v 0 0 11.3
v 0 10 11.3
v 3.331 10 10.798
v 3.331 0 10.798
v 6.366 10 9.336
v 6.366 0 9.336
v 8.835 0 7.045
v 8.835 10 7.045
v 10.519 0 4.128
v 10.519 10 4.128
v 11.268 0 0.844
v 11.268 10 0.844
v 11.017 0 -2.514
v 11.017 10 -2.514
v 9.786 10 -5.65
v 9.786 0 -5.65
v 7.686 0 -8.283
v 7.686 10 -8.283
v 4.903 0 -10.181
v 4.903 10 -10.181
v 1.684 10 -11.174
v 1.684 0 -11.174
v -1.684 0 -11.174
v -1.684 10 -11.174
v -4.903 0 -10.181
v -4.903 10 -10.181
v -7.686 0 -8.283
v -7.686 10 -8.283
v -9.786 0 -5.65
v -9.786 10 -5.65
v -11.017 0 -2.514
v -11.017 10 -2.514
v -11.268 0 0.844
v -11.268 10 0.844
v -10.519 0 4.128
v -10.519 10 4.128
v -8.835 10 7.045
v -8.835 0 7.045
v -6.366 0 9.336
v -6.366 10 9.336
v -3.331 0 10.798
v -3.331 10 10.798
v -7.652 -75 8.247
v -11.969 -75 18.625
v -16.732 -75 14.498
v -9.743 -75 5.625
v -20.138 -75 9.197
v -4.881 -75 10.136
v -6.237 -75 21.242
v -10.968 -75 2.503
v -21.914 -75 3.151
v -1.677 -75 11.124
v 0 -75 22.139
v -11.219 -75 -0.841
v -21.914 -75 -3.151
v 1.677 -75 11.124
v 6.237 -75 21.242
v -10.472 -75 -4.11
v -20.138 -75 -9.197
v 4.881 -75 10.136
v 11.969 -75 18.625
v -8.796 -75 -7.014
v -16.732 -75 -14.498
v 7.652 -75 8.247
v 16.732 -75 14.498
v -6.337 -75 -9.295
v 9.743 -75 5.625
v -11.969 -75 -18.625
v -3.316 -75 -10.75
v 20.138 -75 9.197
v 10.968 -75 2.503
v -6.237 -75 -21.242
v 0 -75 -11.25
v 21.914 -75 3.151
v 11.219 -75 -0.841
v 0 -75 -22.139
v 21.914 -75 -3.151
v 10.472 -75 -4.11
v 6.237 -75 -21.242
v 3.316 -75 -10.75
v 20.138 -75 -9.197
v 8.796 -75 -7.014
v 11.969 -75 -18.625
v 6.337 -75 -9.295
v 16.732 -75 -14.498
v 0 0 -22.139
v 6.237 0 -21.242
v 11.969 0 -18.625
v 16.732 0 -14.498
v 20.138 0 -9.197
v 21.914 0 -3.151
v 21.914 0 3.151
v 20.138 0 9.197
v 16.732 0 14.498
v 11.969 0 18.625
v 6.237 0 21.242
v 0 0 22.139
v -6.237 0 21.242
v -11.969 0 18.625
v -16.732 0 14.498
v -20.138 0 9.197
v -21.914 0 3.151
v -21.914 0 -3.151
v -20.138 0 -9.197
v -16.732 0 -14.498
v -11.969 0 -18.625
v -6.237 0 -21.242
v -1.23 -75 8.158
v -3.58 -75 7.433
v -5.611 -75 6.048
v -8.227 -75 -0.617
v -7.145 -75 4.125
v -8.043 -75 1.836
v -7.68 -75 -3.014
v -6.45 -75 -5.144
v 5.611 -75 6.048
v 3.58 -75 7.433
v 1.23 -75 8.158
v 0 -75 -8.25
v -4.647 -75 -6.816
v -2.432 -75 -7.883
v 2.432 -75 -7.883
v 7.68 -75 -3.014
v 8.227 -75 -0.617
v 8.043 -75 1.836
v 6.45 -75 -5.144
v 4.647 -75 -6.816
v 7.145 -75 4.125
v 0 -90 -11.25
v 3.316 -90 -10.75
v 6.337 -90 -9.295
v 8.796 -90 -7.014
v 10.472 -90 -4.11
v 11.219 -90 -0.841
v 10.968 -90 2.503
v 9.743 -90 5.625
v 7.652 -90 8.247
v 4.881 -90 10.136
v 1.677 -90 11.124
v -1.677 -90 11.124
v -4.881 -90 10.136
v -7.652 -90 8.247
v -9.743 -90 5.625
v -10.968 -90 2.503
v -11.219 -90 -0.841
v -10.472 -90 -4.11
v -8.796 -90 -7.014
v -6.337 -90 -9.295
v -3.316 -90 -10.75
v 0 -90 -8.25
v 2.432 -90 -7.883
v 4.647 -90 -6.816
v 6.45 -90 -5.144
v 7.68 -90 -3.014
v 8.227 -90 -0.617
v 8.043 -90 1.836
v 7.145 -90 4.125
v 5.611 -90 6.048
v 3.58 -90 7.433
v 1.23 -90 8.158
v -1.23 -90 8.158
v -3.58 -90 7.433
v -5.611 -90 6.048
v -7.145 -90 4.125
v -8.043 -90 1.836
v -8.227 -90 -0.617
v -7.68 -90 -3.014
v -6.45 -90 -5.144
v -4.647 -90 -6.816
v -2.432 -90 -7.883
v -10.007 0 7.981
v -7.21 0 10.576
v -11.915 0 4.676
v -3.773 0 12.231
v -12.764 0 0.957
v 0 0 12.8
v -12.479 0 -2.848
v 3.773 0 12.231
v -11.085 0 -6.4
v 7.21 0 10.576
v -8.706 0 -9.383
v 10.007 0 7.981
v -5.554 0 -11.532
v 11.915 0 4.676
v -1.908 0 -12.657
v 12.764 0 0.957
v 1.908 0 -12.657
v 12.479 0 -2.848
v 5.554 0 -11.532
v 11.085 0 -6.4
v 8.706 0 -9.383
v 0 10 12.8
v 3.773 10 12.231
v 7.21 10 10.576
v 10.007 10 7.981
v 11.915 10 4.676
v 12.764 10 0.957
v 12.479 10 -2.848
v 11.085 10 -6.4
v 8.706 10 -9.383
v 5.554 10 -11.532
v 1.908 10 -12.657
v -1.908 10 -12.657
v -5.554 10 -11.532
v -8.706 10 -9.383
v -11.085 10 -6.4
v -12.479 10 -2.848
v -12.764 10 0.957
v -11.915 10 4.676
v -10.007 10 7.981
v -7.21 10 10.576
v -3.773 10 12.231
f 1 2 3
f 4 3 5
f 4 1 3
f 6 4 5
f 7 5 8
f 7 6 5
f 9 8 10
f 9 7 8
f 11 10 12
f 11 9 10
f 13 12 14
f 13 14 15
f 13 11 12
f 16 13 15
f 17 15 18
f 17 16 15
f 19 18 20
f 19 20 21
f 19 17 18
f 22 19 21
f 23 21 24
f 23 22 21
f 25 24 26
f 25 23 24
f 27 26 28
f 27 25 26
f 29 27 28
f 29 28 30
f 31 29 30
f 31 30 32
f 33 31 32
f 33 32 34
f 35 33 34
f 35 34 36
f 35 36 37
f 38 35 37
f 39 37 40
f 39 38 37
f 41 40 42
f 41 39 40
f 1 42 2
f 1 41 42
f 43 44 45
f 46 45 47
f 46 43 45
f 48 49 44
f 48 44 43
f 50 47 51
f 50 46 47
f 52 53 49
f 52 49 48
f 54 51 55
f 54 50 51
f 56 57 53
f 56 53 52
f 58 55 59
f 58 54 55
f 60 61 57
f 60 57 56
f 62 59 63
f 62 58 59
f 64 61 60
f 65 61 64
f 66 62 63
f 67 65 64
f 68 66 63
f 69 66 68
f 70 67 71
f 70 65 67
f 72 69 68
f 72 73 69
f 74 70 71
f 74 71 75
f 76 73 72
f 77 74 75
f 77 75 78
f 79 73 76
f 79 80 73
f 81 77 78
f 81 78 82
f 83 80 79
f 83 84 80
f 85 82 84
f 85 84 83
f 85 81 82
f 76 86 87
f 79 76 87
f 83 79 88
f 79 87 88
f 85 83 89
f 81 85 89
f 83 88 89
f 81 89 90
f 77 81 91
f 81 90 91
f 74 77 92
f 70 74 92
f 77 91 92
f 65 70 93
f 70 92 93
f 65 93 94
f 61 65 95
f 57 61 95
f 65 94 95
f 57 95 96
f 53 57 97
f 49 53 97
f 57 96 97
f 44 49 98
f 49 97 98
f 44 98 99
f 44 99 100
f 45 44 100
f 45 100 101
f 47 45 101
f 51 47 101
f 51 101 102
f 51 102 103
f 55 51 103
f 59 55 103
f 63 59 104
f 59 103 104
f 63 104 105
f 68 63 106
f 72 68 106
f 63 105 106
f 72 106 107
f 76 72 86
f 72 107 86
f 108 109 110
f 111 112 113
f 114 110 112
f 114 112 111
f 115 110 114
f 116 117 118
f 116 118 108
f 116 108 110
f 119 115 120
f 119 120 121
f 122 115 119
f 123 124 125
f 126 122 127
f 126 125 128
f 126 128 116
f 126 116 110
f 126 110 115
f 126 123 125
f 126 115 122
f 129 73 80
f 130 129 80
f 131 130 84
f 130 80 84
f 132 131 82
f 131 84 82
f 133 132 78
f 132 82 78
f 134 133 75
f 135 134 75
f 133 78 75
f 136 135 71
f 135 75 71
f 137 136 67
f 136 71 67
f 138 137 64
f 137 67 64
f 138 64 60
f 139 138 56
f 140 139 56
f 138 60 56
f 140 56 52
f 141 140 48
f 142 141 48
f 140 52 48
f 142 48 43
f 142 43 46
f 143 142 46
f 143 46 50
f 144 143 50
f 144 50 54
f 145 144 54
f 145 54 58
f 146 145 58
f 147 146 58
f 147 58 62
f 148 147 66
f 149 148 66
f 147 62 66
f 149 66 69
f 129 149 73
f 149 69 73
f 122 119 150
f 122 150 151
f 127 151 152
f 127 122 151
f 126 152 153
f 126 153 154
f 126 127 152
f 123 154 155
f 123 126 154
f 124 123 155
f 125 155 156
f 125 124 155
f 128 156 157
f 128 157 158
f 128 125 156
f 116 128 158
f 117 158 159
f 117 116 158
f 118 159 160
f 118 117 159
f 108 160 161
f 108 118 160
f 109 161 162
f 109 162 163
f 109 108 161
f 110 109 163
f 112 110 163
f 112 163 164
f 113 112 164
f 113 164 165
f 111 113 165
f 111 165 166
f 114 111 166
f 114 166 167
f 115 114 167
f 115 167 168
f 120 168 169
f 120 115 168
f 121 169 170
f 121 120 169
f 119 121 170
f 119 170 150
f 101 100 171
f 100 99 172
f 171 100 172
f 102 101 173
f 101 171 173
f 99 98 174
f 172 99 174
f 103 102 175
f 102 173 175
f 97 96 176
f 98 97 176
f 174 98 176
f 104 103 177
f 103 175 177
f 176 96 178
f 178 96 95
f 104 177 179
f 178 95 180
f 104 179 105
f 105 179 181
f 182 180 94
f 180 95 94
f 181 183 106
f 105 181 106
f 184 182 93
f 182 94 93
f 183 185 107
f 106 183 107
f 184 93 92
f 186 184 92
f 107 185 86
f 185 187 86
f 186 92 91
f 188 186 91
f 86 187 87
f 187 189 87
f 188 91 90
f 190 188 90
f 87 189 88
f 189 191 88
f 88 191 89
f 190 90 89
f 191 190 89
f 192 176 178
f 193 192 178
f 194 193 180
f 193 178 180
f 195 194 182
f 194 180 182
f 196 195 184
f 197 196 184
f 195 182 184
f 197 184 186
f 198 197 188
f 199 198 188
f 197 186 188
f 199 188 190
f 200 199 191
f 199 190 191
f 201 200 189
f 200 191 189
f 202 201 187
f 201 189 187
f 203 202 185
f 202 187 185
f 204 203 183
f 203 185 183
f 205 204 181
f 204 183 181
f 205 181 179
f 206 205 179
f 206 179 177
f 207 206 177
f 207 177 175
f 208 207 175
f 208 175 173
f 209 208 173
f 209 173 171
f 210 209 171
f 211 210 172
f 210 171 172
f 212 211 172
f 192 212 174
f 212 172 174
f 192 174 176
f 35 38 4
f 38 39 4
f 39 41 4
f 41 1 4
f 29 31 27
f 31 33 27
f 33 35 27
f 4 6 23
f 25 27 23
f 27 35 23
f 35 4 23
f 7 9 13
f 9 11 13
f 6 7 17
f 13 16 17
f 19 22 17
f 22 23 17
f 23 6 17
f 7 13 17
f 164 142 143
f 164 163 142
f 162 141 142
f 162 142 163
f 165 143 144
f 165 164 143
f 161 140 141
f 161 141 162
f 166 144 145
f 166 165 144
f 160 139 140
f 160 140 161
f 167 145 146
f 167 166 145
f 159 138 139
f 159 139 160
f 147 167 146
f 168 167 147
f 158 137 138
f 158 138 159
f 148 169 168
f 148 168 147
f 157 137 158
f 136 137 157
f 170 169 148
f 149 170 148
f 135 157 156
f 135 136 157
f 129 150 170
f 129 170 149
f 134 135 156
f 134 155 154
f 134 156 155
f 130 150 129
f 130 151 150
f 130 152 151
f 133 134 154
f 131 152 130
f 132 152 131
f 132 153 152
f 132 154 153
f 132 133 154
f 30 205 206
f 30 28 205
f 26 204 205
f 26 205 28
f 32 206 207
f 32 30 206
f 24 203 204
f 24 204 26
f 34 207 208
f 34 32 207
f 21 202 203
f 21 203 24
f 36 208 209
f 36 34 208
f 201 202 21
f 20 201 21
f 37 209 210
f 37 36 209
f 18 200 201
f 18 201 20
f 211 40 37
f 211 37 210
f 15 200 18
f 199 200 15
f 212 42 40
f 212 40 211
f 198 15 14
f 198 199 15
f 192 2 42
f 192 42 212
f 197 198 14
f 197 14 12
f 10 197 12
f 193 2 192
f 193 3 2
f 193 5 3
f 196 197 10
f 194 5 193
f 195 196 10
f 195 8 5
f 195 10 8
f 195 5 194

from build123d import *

# Parameters (mm, degrees)
SKETCH1_R           = 12.8
SKETCH1_R_2         = 11.3
BOSS_EXTRUDE1_DEPTH = 10
SKETCH2_R           = 22.139080492
BOSS_EXTRUDE2_DEPTH = 75
SKETCH3_R           = 11.25
SKETCH3_R_2         = 8.25
BOSS_EXTRUDE3_DEPTH = 15


with BuildPart() as part:
    # Sketch1 → Boss-Extrude1 (new body)
    with BuildSketch(Plane(origin=(0, 0, 0), x_dir=(1, 0, 0), z_dir=(0, 1, 0))):
        with Locations(Location((0, 0, 0), (0, 0, 270))):
            Circle(SKETCH1_R)
        with Locations(Location((0, 0, 0), (0, 0, 270))):
            Circle(SKETCH1_R_2, mode=Mode.SUBTRACT)
    extrude(amount=BOSS_EXTRUDE1_DEPTH)

    # Sketch2 → Boss-Extrude2 (add)
    with BuildSketch(Plane.XZ):
        with Locations(Location((0, 0, 0), (0, 0, 270))):
            Circle(SKETCH2_R)
    extrude(amount=BOSS_EXTRUDE2_DEPTH)

    # Sketch3 → Boss-Extrude3 (add)
    with BuildSketch(Plane.XZ.offset(75)):
        with Locations(Location((0, 0, 0), (0, 0, 270))):
            Circle(SKETCH3_R)
        with Locations(Location((0, 0, 0), (0, 0, 270))):
            Circle(SKETCH3_R_2, mode=Mode.SUBTRACT)
    extrude(amount=BOSS_EXTRUDE3_DEPTH)


solid = part.part
